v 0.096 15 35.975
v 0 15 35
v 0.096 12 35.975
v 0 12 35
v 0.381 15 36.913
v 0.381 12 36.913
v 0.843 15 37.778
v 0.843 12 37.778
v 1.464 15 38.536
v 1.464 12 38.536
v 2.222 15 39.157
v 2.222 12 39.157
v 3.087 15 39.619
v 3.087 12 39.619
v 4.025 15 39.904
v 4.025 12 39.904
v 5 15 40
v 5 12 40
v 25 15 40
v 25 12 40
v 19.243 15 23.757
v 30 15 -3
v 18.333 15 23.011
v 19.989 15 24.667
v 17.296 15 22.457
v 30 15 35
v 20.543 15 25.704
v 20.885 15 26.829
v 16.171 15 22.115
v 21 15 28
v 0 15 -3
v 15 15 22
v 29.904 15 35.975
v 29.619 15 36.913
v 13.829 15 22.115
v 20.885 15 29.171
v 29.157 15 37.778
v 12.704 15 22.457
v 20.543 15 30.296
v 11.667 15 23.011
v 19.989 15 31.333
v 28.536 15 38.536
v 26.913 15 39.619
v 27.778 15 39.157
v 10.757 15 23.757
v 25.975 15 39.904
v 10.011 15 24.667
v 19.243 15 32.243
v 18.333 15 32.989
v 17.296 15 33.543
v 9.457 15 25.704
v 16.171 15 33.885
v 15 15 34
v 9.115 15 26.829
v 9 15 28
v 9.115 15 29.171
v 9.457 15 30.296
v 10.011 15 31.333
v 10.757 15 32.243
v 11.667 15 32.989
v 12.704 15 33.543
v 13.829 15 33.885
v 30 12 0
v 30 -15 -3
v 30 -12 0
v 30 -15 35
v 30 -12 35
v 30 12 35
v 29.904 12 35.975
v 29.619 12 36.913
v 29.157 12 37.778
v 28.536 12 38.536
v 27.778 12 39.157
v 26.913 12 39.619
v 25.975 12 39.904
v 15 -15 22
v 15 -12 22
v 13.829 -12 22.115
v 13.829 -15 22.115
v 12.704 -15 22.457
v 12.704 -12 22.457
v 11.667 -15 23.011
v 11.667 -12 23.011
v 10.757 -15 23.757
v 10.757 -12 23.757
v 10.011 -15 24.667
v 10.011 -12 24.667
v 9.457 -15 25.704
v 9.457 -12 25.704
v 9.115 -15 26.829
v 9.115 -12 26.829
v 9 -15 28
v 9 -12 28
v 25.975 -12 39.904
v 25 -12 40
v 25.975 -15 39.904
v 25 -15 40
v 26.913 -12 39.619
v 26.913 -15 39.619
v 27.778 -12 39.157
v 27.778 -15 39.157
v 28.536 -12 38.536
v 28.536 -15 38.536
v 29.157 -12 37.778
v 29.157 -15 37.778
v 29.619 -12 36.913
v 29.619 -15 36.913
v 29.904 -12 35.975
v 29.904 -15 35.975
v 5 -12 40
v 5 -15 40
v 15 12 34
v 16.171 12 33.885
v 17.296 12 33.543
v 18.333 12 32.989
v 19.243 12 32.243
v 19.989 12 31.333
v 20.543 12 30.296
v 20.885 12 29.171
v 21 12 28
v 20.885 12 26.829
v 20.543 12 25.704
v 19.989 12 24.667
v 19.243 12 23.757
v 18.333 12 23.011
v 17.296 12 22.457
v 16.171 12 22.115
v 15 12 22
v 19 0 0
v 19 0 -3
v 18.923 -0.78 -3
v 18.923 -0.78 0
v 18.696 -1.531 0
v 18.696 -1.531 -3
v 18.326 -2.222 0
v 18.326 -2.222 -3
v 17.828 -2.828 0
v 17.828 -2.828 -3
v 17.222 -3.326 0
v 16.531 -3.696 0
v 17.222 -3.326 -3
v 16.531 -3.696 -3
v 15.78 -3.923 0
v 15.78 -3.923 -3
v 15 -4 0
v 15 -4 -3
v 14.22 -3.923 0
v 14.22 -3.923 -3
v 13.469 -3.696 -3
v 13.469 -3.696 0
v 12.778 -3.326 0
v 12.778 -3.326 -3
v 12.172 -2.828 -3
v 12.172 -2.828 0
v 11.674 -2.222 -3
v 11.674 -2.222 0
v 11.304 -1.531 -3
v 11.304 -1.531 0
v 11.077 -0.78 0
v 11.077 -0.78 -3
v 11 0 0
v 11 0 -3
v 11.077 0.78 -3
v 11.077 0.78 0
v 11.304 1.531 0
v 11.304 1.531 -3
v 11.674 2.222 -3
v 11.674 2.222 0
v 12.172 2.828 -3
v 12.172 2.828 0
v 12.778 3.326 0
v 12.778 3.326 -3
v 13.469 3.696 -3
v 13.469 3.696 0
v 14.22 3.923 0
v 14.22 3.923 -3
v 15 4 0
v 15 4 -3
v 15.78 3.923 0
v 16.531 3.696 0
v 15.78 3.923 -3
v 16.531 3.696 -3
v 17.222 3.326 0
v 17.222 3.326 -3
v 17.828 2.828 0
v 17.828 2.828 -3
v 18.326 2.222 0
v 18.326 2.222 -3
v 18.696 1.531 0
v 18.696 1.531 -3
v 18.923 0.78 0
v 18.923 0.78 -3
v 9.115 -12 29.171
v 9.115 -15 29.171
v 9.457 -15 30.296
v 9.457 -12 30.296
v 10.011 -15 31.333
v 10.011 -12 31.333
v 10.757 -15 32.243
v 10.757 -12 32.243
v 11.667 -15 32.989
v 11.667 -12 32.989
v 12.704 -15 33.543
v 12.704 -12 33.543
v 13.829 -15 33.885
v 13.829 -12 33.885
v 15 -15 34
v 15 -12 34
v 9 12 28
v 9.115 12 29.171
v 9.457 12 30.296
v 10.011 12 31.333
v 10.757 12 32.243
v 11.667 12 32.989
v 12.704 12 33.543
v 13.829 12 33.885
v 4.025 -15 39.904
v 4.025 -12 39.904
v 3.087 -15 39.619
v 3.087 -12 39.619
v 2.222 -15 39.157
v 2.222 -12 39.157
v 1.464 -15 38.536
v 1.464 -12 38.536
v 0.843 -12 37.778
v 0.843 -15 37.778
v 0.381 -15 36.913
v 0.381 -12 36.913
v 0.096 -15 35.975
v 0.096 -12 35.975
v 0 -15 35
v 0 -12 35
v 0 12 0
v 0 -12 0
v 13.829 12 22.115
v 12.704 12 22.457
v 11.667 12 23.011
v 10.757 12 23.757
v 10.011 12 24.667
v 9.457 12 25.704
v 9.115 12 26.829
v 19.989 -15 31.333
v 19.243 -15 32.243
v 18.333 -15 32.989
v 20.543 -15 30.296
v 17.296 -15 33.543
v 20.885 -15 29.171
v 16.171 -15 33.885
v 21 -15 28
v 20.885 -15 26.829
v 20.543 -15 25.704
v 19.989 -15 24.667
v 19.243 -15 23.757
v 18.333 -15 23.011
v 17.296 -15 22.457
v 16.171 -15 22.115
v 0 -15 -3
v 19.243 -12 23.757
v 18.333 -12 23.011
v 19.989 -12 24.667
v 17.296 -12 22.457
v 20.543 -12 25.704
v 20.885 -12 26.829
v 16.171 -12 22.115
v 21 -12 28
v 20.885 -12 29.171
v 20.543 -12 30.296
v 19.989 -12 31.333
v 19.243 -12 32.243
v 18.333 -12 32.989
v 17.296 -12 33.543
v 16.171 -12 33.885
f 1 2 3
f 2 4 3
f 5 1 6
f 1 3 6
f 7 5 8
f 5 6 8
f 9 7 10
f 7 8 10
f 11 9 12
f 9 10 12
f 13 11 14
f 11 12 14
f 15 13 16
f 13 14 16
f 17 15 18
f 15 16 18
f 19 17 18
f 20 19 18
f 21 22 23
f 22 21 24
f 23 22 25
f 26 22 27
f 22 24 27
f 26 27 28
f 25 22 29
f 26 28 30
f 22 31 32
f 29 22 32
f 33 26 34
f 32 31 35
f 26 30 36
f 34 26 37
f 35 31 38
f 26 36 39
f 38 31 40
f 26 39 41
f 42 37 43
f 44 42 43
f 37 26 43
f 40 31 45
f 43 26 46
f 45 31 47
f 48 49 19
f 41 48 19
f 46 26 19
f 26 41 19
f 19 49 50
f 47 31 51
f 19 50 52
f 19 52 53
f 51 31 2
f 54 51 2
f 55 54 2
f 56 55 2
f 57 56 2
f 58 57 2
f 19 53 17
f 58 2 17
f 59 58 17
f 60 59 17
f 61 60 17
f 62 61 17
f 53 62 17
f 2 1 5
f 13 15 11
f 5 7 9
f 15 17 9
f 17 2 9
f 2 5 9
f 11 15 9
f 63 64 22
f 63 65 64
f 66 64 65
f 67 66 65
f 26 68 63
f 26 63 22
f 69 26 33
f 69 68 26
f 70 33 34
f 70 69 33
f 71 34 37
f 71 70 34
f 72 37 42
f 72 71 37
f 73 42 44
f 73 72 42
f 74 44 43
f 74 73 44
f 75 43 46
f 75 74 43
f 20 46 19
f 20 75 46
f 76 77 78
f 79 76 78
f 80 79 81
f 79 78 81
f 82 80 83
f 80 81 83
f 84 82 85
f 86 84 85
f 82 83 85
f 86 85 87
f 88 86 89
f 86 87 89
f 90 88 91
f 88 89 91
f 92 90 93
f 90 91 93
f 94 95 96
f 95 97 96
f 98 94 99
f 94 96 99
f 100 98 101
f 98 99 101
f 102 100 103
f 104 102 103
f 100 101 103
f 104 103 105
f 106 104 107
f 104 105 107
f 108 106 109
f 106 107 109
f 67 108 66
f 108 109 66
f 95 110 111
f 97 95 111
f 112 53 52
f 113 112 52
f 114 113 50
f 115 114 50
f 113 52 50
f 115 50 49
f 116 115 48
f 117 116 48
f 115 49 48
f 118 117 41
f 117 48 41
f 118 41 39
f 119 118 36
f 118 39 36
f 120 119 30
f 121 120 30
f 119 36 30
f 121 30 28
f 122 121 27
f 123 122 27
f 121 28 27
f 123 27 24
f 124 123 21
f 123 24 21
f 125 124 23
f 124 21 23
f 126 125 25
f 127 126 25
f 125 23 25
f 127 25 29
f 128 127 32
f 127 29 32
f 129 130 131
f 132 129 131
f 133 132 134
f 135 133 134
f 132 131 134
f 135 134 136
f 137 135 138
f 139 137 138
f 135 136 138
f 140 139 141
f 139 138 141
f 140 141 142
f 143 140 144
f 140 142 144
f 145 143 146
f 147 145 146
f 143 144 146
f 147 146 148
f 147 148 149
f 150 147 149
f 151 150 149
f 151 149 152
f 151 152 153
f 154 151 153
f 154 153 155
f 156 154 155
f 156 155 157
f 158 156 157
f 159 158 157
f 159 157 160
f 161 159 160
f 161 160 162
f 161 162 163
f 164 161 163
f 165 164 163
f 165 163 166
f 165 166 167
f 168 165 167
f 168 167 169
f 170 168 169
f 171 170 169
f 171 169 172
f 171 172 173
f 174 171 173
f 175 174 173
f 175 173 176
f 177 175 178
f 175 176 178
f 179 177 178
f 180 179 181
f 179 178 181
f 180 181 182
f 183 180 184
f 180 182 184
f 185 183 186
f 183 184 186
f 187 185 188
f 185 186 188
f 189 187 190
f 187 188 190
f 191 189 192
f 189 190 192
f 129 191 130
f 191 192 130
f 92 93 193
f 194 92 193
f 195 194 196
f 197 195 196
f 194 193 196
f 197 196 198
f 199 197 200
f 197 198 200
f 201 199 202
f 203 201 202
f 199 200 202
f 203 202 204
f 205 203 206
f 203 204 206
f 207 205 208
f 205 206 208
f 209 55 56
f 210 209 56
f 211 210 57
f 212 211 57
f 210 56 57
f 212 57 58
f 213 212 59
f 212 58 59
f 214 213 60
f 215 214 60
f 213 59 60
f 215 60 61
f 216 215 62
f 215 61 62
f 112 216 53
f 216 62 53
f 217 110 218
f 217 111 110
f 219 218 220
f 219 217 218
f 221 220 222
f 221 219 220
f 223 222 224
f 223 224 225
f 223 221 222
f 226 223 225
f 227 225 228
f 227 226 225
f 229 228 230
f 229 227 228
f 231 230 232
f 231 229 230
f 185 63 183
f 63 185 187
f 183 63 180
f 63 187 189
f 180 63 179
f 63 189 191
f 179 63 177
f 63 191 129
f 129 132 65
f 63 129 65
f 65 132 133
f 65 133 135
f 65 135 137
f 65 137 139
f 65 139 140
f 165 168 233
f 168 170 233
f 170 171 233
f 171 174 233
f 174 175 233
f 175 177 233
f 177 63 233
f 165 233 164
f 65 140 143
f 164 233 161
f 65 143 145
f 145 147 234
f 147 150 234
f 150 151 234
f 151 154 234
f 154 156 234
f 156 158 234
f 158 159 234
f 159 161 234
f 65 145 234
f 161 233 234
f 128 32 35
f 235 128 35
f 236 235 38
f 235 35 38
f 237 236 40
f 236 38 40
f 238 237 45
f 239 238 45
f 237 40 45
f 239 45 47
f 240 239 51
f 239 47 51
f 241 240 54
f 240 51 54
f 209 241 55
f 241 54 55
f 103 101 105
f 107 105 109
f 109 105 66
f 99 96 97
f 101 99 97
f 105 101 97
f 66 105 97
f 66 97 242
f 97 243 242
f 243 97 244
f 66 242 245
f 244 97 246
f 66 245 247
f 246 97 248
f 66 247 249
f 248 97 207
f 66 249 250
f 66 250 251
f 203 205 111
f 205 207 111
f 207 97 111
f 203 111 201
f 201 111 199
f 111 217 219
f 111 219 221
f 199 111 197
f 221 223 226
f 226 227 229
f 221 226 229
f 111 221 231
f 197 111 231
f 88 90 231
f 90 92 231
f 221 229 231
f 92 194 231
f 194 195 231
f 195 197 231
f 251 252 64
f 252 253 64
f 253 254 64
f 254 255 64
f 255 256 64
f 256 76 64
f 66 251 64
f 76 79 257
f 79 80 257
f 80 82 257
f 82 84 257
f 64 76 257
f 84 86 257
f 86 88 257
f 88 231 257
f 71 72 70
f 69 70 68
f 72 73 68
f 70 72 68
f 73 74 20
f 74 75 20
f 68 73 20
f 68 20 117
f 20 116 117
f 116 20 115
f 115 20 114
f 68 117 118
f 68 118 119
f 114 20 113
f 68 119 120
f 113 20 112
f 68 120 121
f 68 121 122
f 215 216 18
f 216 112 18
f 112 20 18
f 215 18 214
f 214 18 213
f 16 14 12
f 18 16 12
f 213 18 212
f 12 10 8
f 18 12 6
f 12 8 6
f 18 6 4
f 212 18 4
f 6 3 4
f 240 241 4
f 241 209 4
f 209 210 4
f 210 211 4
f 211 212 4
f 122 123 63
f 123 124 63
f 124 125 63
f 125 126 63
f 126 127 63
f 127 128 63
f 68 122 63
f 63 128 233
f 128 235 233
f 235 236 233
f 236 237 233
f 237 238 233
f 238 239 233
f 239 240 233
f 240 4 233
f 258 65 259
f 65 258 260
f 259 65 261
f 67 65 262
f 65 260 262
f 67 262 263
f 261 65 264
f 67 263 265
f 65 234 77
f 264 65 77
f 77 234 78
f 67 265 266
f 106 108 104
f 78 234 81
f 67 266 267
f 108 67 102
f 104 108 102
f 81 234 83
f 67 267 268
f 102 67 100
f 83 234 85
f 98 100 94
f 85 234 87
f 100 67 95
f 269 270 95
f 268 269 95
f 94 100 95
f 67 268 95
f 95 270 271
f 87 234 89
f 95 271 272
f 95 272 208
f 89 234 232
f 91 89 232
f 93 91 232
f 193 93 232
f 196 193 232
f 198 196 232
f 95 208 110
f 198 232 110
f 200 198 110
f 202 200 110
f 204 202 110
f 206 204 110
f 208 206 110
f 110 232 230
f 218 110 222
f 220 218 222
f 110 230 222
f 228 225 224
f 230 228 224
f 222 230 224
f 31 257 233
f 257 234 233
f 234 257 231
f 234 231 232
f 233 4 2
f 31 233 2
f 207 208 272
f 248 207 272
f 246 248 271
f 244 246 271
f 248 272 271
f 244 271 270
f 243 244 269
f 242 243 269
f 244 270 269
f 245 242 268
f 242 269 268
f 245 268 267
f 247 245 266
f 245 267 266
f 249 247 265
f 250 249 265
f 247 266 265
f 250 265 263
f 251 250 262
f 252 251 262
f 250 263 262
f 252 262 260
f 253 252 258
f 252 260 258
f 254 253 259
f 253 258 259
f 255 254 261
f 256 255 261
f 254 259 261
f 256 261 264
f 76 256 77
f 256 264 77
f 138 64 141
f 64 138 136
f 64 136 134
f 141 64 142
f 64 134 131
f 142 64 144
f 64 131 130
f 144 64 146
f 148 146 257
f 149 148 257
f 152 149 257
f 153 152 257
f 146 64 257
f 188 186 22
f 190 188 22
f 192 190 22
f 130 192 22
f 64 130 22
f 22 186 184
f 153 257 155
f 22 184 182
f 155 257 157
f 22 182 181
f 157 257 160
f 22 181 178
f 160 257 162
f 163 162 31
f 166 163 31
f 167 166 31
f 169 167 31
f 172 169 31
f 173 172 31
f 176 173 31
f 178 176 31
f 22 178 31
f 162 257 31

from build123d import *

# Parameters (mm, degrees)
F1_DEPTH = 30
F3_DEPTH = 30.001
F4_R     = 5
F5_R     = 4
F6_DEPTH = 43.001


with BuildPart() as f1:
    # F0 (on Right) → F1 (new body)
    with BuildSketch(Plane.YZ):
        Polygon((-12, 40), (-15, 40), (-15, -3), (15, -3), (15, 40), (12, 40), (12, 0), (-12, 0), align=None)
    extrude(amount=F1_DEPTH)

    # F2 (on face) → F3 (cut, through all)
    with BuildSketch(Plane(origin=(0, 15, 0), x_dir=(-1, 0, 0), z_dir=(0, 1, 0))):
        with BuildLine():
            ThreePointArc((-15, 22), (-10.757359, 23.757359), (-9, 28))
            ThreePointArc((-9, 28), (-10.757359, 32.242641), (-15, 34))
            Line((-15, 34), (-15, 22))
        make_face()
        with BuildLine():
            Line((-15, 22), (-15, 34))
            ThreePointArc((-15, 34), (-21, 28), (-15, 22))
        make_face()
    extrude(amount=-F3_DEPTH, mode=Mode.SUBTRACT)

    # F4
    f4_edges = [f1.edges().sort_by_distance(p)[0] for p in [
        (0, 13.5, 40),
        (0, -13.5, 40),
        (30, 13.5, 40),
        (30, -13.5, 40),
    ]]
    fillet(f4_edges, radius=F4_R)

    # F5 (on face) → F6 (cut, through all)
    with BuildSketch(Plane(origin=(0, 0, -3), x_dir=(1, 0, 0), z_dir=(0, 0, -1))):
        with Locations((15, 0)):
            Circle(F5_R)
    extrude(amount=-F6_DEPTH, mode=Mode.SUBTRACT)


solid = f1.part
